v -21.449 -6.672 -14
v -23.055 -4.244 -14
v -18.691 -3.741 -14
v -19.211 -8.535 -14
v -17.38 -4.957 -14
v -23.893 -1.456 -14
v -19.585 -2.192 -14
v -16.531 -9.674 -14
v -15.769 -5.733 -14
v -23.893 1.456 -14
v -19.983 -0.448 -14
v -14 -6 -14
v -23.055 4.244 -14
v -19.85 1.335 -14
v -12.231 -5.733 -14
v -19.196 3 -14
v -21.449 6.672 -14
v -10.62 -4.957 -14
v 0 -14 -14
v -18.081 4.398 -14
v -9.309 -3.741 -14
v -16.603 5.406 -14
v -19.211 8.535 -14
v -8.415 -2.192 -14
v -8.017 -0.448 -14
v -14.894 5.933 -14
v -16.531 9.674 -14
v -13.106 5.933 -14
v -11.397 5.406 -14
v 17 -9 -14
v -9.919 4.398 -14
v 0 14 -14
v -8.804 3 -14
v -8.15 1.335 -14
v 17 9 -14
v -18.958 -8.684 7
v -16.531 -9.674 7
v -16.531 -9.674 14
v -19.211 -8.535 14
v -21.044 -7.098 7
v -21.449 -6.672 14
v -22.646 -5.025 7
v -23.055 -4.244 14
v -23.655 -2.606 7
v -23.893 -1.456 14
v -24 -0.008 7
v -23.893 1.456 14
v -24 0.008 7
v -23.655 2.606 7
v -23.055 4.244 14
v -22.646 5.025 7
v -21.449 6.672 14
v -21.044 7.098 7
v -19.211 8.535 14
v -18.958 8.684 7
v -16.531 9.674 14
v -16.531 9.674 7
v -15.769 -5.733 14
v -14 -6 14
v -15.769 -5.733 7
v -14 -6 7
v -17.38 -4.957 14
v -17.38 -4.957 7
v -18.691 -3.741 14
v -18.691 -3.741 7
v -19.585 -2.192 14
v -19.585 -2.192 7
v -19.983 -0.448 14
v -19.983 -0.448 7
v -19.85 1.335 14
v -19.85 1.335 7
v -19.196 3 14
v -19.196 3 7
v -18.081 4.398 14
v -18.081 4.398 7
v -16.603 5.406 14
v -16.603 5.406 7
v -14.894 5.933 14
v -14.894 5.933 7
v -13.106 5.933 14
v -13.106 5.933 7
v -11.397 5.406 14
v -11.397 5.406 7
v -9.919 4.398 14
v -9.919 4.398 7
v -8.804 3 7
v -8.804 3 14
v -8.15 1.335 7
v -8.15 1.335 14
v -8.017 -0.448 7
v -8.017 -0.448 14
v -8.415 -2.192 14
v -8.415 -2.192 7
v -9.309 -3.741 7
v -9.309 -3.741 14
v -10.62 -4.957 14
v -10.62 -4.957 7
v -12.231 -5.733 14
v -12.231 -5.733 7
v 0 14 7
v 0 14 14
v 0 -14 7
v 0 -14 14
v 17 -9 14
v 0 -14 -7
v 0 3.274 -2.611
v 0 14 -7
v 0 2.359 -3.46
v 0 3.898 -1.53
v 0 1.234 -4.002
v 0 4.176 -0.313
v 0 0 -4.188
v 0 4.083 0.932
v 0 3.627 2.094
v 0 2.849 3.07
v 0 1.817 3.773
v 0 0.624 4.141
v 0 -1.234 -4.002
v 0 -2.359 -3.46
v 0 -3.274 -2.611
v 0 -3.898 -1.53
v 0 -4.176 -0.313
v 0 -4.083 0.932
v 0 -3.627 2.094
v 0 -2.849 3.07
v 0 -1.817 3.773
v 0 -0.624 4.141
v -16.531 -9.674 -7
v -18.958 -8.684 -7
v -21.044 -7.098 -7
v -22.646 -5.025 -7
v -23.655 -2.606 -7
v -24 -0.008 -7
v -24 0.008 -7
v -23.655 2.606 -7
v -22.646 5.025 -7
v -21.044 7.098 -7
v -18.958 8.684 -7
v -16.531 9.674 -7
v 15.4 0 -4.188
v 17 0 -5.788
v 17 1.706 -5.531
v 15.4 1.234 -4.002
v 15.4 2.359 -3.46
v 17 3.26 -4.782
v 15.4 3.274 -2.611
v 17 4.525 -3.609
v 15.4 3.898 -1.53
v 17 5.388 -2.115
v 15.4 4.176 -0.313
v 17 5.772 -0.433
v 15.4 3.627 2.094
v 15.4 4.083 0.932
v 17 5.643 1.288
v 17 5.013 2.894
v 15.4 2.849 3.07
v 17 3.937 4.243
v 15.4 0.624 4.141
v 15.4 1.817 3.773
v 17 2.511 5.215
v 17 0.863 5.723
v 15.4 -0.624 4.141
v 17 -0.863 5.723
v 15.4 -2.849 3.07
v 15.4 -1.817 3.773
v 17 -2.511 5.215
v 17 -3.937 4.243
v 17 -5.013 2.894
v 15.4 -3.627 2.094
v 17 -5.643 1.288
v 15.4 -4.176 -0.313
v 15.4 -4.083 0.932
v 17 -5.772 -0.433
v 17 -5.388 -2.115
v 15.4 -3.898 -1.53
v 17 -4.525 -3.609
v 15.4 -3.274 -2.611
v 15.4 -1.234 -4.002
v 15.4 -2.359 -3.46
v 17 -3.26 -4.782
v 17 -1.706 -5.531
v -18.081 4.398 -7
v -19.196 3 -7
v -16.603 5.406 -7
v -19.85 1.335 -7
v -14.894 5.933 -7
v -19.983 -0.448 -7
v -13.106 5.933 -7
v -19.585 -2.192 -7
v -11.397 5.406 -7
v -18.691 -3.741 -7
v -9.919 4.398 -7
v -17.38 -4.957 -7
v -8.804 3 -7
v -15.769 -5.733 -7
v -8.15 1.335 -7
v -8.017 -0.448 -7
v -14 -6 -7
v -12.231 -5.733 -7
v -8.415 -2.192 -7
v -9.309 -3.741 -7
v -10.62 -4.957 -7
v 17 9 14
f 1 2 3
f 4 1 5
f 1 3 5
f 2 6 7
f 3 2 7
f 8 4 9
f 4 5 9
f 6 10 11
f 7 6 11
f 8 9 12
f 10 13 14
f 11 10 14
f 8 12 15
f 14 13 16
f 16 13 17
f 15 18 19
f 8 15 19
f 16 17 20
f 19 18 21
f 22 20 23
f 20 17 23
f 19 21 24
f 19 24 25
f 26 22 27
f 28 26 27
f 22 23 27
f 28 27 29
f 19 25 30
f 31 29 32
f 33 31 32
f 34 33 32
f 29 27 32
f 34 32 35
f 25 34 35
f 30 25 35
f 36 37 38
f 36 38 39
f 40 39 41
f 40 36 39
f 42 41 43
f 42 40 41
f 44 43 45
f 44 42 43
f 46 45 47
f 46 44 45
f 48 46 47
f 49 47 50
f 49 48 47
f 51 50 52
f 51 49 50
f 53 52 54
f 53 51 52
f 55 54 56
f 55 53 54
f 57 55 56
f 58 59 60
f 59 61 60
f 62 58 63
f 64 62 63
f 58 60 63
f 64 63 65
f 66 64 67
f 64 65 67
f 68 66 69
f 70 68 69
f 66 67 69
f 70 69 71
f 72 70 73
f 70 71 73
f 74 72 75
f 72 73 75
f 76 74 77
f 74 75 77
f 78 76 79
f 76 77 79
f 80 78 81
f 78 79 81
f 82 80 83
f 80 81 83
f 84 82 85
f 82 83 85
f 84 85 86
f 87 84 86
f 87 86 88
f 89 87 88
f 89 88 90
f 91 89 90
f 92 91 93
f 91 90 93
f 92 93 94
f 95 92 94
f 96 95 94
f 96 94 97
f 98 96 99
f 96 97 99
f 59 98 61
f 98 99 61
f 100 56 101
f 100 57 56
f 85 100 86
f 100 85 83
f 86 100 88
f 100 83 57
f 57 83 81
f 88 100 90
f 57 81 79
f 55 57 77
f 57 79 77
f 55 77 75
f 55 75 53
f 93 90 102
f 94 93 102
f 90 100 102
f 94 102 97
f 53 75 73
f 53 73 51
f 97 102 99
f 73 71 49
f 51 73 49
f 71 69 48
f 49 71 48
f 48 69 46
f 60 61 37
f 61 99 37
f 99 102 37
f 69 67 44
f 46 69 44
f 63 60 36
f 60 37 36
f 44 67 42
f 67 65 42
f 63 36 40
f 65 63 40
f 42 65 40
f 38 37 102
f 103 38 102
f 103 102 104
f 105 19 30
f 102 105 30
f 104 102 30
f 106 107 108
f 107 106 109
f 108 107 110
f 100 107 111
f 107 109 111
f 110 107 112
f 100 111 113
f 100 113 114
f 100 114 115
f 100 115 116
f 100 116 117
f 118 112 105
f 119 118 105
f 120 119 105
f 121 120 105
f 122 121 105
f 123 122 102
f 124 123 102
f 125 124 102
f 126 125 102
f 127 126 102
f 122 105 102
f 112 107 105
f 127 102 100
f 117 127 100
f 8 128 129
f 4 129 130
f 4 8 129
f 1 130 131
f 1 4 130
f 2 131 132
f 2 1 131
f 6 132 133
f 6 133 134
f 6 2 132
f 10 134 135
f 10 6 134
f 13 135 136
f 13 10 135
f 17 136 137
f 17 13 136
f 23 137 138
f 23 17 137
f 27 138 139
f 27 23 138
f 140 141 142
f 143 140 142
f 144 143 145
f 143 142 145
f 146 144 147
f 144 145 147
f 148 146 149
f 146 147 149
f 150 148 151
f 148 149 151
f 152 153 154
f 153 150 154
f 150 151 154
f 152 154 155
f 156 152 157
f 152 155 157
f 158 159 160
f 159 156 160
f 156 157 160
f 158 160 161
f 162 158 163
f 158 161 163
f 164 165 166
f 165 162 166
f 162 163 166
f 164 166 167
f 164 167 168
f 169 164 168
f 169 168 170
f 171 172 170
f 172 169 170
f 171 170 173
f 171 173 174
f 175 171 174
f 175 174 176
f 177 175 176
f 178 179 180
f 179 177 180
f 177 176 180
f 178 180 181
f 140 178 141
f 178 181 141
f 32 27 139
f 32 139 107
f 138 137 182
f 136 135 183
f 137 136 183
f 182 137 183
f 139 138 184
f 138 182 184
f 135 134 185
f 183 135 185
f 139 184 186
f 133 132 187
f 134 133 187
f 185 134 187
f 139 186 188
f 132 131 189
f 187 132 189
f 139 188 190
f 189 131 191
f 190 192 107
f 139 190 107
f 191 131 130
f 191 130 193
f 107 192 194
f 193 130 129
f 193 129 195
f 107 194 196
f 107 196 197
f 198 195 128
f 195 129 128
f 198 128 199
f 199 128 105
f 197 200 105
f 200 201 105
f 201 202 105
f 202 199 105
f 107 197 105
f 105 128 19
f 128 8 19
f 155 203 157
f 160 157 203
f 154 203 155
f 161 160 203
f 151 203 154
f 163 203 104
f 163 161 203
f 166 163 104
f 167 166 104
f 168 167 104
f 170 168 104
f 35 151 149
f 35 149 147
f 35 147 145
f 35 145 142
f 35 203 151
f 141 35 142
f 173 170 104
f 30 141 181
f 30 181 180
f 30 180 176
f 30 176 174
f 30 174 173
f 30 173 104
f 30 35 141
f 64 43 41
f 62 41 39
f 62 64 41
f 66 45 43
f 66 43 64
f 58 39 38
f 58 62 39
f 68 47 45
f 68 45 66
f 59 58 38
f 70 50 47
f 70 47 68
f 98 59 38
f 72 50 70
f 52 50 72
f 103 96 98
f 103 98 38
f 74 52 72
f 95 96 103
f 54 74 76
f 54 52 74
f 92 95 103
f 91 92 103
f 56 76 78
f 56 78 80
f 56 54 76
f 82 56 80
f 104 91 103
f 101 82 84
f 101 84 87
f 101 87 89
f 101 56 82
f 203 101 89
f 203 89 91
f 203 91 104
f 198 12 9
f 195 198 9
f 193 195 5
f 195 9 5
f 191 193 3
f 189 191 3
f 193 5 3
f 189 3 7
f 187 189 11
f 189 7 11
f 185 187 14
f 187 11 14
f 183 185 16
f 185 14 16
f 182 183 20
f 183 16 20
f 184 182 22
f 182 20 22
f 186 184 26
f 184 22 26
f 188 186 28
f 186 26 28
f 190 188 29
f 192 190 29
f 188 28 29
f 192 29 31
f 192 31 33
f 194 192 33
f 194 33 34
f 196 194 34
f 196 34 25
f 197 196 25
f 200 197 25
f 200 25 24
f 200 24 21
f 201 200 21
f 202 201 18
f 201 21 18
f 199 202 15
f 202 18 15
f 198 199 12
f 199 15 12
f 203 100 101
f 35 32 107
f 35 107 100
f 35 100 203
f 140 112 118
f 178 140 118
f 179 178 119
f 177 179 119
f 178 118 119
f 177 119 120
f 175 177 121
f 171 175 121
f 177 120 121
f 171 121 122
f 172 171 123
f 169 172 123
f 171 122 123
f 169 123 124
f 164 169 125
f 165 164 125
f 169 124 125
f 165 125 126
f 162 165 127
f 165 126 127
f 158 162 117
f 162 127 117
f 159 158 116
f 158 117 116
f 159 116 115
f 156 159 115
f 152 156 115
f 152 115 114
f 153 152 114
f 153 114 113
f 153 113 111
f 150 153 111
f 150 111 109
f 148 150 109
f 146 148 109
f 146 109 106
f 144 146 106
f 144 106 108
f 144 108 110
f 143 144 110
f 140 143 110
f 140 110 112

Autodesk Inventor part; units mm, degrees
ref_plane "YZ Plane" through (0, 0, 0) normal (1, 0, 0) x (0, 1, 0)
ref_plane "XZ Plane" through (0, 0, 0) normal (0, 1, 0) x (-1, 0, 0)
ref_plane "XY Plane" through (0, 0, 0) normal (0, 0, 1) x (1, 0, 0)
sketch "Эскиз1" plane through (0, 0, 0) normal (0, 0, 1) x (1, 0, 0)
  line L0 (-16.5314, 9.6743) -> (0, 14)
  line L1 (0, 14) -> (17, 9)
  line L2 (17, 9) -> (17, 1.7034)
  line L3 (-67.604, 0) -> (31.1007, 0) projected
  line L4 (-16.5314, -9.6743) -> (0, -14)
  line L5 (0, -14) -> (17, -9)
  line L6 (17, -9) -> (17, 1.7034)
  arc A0 (-16.5314, 9.6743) -> (-16.5314, -9.6743) centre (-14, 0) ccw
  point P0 (0, 0)
  point P1 (-53.5033, 0)
  dimension "d0" = 10
  dimension "d1" = 31
  dimension "d2" = 28
  dimension "d3" = 14
  dimension "d4" = 18
extrude "Выдавливание1" add sketch "Эскиз1" along normal mid plane 28
sketch "Эскиз2" plane through (0, 0, 0) normal (0, 1, 0) x (-1, 0, 0)
  line L0 (0, 7) -> (24, 7)
  line L1 (24, 7) -> (24, -7)
  line L2 (24, -7) -> (0, -7)
  line L3 (0, -7) -> (0, 7)
  line L4 (24, -14) -> (24, 14) projected
  point P0 (0, 0)
  point P1 (0, 0)
  dimension "d7" = 14
extrude "Выдавливание2" cut sketch "Эскиз2" along normal through all both and the other way through all
sketch "Эскиз3" plane through (0, 0, 14) normal (0, 0, 1) x (1, 0, 0)
  arc A0 (-16.5314, 9.6743) -> (-16.5314, -9.6743) centre (-14, 0) ccw projected
  point P0 (0, 0)
hole "Отверстие1" at (-14, 0, 14) direction (0, 0, -1) diameter 12 end through all
sketch "Эскиз4" plane through (17, -9, 14) normal (1, 0, 0) x (0, 0, -1)
  line L0 (28, 18) -> (0, 18) projected
  line L1 (28, 18) -> (28, 0) projected
  point P0 (14, 9)
  point P1 (14, 9)
  dimension "d17" = 9
  dimension "d18" = 14
hole "Отверстие2" at (17, 0, 0) direction (-1, 0, 0) diameter 8.376 end through all thread size "M10x1.5" class "6H" standard "ISO Metric profile"
chamfer "Фаска1" distance 1.6 angle 45 1 edges at (17, 0, 4.188)
properties part number "05.01.001" material "Iron, Cast"
